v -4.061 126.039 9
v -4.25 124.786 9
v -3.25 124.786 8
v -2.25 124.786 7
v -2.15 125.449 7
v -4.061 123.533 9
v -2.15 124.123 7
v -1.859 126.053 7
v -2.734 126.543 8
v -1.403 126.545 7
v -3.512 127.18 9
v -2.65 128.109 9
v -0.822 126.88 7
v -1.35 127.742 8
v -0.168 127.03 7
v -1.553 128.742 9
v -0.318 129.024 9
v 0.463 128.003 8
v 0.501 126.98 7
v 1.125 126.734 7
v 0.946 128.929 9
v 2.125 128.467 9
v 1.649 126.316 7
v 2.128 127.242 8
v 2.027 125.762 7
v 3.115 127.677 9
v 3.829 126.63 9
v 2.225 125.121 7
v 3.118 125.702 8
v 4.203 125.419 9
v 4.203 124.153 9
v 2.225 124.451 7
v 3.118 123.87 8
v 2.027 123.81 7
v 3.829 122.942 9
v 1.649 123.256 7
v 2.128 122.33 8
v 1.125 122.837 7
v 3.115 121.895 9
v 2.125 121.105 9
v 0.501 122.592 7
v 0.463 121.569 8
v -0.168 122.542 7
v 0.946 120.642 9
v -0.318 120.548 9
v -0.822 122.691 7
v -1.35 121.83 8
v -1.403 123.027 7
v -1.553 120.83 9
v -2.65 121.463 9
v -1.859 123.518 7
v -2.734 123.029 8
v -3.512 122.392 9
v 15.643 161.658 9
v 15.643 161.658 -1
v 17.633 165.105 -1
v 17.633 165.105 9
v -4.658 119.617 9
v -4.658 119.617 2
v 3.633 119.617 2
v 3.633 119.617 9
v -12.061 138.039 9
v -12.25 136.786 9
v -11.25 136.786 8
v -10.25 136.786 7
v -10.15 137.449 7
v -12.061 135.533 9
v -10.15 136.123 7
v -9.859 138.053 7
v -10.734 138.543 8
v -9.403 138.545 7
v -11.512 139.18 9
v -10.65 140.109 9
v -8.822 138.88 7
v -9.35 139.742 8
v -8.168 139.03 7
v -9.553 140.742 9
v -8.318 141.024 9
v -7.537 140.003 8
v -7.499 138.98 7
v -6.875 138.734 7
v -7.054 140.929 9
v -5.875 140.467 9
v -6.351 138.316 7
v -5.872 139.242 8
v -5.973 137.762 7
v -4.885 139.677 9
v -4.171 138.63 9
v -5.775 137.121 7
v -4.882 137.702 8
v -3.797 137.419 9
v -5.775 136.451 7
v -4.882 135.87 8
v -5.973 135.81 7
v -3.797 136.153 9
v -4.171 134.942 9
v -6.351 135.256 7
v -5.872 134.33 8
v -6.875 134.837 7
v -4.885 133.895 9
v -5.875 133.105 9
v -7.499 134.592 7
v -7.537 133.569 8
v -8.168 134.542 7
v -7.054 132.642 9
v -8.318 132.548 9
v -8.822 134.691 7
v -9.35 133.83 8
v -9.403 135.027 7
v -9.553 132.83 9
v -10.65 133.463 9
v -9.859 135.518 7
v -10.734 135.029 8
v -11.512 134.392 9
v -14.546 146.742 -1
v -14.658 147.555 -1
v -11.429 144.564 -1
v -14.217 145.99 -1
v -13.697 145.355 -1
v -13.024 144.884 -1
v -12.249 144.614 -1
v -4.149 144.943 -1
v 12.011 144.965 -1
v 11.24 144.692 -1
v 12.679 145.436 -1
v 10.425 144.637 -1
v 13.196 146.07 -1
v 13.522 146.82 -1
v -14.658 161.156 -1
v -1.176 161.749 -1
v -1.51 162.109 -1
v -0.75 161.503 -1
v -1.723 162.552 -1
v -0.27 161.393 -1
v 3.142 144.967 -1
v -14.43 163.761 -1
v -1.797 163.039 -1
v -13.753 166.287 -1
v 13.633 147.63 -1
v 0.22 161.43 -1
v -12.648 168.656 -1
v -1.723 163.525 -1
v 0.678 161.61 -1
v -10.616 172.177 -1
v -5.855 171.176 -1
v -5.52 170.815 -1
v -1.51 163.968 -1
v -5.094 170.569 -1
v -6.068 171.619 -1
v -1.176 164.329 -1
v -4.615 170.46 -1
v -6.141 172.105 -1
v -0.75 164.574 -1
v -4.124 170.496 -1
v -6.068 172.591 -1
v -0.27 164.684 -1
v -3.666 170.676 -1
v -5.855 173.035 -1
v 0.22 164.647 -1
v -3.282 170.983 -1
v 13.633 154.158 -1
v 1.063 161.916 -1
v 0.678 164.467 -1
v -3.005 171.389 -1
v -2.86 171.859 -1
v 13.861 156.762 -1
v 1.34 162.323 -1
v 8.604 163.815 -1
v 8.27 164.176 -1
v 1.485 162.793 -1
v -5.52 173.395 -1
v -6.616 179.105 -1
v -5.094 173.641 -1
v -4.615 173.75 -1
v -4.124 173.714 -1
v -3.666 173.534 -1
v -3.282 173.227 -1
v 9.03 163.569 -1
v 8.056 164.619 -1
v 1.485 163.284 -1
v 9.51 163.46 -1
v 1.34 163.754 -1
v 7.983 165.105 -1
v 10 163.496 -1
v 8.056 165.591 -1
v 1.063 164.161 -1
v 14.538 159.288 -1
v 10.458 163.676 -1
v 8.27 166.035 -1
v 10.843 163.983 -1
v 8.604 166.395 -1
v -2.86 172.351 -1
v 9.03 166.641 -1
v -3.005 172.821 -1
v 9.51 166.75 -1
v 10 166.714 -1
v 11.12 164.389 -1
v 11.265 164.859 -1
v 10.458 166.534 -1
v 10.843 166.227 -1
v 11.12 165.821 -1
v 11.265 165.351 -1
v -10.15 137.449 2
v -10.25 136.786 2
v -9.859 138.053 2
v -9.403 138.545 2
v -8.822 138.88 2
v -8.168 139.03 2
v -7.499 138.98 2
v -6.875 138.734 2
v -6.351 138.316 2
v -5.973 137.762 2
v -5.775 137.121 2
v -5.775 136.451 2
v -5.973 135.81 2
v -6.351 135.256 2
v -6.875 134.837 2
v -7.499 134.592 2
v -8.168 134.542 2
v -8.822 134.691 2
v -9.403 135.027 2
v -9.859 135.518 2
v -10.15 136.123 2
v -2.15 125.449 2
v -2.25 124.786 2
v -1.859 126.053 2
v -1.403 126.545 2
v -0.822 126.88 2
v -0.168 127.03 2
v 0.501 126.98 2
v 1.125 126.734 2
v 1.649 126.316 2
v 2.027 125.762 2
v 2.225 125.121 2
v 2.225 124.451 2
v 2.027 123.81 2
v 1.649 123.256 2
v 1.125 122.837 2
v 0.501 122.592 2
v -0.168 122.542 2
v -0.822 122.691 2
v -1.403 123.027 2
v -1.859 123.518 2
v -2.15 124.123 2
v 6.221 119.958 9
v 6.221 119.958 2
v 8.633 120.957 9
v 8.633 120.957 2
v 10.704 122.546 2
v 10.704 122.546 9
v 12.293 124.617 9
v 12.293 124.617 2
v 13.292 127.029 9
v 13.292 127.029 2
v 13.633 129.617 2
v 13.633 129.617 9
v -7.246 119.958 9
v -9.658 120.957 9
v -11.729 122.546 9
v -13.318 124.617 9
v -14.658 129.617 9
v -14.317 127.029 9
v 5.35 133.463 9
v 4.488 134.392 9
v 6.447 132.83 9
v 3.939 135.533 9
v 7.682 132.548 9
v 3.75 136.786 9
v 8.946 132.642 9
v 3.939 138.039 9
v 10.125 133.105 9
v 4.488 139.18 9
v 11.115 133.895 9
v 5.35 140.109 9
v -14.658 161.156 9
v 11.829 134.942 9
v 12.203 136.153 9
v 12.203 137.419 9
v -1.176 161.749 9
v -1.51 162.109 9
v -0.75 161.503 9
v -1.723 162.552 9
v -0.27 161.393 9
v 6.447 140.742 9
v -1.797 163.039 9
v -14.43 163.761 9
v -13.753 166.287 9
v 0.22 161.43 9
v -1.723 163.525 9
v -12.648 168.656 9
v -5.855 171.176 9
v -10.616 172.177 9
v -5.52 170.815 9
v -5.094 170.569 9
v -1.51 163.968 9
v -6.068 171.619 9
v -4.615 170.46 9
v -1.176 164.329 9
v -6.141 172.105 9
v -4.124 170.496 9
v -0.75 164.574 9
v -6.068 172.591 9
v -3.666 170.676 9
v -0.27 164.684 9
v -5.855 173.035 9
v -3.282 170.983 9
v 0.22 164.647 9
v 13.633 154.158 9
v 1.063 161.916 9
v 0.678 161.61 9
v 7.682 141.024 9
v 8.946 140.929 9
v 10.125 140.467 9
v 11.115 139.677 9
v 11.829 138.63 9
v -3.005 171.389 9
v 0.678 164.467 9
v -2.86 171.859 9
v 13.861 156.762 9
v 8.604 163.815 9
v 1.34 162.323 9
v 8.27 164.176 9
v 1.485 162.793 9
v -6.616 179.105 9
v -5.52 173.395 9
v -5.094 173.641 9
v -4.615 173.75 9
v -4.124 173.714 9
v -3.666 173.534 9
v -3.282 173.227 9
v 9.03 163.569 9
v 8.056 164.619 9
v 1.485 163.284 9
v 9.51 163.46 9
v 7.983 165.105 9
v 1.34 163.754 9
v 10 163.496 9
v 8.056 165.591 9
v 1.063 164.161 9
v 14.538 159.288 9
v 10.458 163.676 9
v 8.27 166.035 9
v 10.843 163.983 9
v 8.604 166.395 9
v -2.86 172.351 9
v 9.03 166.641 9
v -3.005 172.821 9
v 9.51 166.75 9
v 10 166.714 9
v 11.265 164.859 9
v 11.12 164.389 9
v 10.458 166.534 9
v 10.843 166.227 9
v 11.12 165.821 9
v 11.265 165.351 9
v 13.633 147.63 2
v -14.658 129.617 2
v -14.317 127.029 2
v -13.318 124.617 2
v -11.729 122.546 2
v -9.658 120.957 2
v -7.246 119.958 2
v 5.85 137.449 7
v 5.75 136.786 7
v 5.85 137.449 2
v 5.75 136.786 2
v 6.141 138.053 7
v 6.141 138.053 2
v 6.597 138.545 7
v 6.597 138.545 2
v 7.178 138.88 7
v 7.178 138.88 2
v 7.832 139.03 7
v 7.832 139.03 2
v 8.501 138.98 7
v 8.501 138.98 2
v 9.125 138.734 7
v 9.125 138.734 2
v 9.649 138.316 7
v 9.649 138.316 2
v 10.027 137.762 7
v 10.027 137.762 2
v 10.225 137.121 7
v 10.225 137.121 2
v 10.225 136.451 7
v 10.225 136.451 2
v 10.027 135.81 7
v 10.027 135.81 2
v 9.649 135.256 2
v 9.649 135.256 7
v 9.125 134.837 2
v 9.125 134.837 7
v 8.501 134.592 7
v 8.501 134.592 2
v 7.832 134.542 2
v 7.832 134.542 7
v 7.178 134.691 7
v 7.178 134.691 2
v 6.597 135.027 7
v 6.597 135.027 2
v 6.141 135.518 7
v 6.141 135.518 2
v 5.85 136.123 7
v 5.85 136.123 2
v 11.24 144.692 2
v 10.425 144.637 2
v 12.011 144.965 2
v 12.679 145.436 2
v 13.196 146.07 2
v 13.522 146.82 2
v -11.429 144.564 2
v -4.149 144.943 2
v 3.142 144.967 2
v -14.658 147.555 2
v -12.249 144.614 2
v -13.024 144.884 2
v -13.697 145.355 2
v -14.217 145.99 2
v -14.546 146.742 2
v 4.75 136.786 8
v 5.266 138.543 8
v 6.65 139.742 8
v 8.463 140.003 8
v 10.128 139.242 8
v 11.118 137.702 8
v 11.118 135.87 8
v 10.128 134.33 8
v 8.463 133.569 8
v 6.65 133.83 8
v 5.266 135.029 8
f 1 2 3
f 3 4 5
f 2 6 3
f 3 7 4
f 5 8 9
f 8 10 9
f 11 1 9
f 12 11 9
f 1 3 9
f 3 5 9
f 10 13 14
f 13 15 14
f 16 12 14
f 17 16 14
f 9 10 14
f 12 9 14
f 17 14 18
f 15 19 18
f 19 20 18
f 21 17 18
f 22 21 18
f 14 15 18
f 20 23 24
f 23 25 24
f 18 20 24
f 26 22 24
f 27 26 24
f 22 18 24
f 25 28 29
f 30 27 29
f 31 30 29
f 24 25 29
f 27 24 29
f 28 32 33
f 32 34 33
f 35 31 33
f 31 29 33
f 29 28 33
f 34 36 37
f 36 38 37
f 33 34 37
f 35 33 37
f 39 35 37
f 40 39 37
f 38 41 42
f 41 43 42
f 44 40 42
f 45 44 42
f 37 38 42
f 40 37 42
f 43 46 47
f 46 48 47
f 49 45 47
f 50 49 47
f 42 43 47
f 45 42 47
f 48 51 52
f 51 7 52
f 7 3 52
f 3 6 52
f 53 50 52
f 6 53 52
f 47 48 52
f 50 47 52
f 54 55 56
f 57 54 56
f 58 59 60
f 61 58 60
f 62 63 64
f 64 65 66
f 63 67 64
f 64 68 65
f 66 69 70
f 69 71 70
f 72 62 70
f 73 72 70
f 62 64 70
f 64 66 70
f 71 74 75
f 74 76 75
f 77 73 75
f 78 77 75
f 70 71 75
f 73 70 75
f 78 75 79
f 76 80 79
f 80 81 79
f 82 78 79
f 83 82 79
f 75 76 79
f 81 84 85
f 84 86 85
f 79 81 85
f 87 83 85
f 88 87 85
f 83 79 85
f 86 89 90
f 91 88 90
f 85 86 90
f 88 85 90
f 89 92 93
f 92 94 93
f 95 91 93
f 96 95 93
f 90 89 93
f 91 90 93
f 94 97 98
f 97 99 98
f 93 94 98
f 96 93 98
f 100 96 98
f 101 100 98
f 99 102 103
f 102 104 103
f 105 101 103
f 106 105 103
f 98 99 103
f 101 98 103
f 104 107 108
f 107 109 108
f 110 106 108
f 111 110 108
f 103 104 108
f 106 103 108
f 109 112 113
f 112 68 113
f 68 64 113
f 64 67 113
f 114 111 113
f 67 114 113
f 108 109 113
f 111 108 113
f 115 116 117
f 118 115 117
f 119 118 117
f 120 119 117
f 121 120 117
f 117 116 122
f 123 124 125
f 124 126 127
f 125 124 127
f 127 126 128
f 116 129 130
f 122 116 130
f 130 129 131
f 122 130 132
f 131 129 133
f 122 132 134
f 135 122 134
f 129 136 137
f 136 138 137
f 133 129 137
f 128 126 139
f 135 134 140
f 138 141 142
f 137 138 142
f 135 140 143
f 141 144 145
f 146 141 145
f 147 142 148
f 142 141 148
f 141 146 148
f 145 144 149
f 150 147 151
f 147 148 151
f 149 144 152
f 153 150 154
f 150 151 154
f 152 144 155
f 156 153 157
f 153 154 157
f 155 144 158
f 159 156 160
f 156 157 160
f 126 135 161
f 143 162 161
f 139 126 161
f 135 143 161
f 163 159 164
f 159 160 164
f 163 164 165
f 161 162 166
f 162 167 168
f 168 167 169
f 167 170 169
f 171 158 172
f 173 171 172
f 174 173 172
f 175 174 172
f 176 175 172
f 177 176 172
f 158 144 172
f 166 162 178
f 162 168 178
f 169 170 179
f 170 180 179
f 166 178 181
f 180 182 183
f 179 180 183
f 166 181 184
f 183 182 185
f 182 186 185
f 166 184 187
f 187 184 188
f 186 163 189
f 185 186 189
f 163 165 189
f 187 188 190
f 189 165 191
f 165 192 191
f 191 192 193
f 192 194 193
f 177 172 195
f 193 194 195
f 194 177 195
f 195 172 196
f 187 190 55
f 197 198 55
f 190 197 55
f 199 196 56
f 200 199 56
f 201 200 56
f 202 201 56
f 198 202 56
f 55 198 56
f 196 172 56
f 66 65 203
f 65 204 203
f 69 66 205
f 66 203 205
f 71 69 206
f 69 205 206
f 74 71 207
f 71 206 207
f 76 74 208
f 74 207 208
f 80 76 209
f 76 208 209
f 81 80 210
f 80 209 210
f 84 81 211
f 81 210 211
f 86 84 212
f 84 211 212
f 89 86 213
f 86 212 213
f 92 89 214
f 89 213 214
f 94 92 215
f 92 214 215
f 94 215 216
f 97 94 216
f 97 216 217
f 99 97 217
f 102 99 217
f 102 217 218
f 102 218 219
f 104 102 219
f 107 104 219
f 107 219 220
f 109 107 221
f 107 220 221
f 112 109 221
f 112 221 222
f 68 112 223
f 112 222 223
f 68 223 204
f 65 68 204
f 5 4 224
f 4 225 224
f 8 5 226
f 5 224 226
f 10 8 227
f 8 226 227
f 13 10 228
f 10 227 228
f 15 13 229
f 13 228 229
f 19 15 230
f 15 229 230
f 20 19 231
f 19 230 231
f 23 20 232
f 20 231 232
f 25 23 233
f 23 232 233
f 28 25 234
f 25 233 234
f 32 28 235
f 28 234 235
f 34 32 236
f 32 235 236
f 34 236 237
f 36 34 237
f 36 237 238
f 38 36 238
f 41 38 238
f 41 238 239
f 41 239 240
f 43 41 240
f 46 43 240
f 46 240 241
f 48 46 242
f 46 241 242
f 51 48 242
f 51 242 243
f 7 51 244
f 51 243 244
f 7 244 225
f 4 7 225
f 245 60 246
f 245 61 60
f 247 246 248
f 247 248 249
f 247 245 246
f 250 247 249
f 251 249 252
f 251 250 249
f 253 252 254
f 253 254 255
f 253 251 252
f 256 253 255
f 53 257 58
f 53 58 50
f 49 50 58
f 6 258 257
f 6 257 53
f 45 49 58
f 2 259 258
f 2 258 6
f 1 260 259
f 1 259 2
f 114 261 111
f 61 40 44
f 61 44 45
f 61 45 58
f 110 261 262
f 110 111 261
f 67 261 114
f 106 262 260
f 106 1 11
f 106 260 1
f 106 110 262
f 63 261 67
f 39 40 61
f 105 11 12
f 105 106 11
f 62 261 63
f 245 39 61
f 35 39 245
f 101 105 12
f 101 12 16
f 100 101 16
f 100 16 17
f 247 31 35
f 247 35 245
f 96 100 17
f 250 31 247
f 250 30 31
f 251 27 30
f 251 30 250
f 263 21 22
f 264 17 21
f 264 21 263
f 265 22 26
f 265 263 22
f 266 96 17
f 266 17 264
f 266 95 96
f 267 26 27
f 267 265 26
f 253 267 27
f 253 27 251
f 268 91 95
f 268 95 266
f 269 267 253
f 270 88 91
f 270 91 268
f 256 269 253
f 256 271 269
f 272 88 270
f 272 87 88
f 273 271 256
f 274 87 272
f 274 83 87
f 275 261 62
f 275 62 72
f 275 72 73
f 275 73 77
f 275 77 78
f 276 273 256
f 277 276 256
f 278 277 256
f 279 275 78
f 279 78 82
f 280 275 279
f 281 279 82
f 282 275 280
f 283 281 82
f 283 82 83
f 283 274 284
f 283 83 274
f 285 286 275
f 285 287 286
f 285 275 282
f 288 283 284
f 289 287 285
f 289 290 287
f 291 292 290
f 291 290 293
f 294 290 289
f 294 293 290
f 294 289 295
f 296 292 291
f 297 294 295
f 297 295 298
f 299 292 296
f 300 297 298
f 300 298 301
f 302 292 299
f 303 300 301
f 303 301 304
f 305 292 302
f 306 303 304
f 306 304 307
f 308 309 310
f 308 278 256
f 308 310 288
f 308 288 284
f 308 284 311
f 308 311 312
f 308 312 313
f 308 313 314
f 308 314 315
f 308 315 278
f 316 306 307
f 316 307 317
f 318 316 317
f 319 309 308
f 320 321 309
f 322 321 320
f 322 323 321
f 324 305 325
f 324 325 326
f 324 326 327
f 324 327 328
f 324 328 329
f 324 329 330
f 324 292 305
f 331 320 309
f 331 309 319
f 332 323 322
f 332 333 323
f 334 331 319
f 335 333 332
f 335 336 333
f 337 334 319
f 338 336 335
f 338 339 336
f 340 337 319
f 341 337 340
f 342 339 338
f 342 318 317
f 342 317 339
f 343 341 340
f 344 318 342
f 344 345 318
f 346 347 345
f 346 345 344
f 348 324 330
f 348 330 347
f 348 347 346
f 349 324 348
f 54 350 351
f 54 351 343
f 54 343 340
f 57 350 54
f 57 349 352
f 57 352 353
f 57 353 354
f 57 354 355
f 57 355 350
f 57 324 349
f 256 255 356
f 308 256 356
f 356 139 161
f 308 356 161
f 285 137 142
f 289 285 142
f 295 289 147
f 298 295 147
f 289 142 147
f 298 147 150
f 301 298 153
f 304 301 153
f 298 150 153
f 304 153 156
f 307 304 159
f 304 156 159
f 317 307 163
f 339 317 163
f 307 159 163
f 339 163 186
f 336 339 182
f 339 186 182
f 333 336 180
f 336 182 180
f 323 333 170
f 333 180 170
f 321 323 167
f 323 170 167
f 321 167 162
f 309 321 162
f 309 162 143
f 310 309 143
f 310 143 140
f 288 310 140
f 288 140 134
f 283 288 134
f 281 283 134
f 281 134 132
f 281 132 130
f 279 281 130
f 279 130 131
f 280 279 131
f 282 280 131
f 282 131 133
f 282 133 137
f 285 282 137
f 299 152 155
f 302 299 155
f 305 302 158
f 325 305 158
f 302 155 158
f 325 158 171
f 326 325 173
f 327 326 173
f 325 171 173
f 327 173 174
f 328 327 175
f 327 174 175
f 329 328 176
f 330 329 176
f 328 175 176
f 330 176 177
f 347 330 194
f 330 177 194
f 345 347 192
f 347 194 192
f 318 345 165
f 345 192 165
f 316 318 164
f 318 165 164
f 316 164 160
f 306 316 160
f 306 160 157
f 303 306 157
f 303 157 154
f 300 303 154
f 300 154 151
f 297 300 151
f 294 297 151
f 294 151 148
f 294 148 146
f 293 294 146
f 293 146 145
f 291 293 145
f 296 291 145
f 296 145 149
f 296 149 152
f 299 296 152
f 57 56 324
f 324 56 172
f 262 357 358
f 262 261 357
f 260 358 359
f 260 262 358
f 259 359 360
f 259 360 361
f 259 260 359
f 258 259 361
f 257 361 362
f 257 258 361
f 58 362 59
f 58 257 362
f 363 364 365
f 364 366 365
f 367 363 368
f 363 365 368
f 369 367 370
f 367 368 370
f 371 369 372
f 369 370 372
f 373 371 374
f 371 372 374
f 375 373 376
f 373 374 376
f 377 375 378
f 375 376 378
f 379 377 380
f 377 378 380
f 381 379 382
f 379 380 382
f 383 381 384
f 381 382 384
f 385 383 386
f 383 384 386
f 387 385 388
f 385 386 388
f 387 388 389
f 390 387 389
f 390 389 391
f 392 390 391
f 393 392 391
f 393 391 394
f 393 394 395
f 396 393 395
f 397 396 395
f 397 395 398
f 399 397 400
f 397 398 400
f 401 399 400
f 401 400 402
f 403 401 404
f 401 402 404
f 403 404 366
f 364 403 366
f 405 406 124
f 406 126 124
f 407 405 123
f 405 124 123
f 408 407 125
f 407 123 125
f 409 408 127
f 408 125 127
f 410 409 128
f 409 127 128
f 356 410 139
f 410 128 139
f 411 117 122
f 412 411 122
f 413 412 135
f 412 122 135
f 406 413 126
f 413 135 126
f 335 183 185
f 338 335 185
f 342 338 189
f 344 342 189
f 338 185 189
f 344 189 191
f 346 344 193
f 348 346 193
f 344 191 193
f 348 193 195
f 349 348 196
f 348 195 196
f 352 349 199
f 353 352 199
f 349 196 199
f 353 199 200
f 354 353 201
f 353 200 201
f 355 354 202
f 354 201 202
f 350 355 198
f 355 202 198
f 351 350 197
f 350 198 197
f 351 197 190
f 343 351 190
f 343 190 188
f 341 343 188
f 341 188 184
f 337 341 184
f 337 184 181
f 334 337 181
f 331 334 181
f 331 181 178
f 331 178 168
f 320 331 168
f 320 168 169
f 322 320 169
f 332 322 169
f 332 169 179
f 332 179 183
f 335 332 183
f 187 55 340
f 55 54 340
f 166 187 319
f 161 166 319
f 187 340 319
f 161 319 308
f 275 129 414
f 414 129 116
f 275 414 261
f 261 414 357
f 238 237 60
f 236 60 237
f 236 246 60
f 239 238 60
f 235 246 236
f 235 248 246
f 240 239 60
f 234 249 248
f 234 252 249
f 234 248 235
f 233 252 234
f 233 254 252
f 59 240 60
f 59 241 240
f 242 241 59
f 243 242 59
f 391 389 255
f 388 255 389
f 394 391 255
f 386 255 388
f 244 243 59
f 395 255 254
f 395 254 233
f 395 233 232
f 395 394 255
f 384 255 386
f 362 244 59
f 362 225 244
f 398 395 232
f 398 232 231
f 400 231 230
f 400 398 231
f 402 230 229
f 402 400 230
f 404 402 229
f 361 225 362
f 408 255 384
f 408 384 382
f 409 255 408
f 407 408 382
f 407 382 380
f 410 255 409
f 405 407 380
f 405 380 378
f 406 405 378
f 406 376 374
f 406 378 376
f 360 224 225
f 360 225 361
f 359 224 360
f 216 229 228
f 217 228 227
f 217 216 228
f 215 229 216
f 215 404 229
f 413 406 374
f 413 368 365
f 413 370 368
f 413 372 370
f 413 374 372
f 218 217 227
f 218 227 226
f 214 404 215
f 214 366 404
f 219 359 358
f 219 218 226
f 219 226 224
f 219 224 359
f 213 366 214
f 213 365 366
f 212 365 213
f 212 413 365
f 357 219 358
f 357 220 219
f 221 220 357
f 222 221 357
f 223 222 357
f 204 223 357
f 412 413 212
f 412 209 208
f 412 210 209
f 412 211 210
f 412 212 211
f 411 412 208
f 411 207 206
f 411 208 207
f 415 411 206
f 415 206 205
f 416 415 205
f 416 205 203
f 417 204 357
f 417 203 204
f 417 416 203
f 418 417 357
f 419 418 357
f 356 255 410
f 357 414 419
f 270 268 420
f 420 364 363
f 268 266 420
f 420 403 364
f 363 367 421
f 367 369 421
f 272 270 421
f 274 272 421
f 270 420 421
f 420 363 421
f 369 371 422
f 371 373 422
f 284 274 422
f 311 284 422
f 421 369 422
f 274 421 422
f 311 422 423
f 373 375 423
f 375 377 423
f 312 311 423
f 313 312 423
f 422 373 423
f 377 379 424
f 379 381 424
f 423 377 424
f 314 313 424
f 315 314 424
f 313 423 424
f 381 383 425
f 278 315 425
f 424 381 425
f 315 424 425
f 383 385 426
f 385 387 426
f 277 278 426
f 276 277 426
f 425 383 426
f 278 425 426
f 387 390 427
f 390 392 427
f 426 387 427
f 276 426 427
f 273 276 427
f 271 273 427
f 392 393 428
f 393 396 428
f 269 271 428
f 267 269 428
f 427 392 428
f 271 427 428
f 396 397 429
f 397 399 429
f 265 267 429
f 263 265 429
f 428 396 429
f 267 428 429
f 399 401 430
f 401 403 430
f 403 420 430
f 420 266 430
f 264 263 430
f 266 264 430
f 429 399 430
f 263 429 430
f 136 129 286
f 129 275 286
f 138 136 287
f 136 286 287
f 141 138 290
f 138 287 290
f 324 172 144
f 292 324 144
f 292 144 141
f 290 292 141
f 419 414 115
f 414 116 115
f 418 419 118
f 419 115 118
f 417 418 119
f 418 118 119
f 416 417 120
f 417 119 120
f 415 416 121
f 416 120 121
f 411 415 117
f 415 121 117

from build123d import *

# Parameters (mm, degrees)
BOSS_EXTRUDE1_DEPTH                                 = 9
BOSS_EXTRUDE1_DEPTH_BACK                            = 1
CUT_EXTRUDE1_DEPTH                                  = 3
CSK_FOR_M4_COUNTERSUNK_FLAT_HEAD_SCREW2_D           = 4.5
CSK_FOR_M4_COUNTERSUNK_FLAT_HEAD_SCREW2_CSINK_D     = 8.5
CSK_FOR_M4_COUNTERSUNK_FLAT_HEAD_SCREW2_CSINK_ANGLE = 90
FILLET1_R                                           = 15
FILLET2_R                                           = 10
FILLET3_R                                           = 3
SKETCH12_R                                          = 1.65
CUT_EXTRUDE2_DEPTH                                  = 181.248579312


with BuildPart() as part:
    # Sketch1 → Boss-Extrude1 (new, two sides: drawn at the far end of the back side and taken through both)
    with BuildSketch(Plane.XY.offset(-BOSS_EXTRUDE1_DEPTH_BACK)):
        Polygon((-14.65789802, 119.616999761), (13.633055873, 119.616999761), (13.633055873, 139.616999761), (13.633055873, 158.176865611), (17.633055873, 165.105068841), (-6.615655433, 179.105068841), (-10.615655433, 172.176865611), (-14.65789802, 165.175496074), (-14.65789802, 158.176865611), (-14.65789802, 139.616999761), align=None)
    extrude(amount=BOSS_EXTRUDE1_DEPTH + BOSS_EXTRUDE1_DEPTH_BACK)

    # Sketch3 → Cut-Extrude1 (cut)
    with BuildSketch(Plane(origin=(0, 0, -1), x_dir=(-1, 0, 0), z_dir=(0, 0, -1))):
        with BuildLine():
            Line((-15, 144.248115566), (-15, 114.785930714))
            Line((-15, 114.785930714), (15, 114.785930714))
            Line((15, 114.785930714), (15, 144.248115566))
            ThreePointArc((15, 144.248115566), (0, 145), (-15, 144.248115566))
        make_face()
    extrude(amount=-CUT_EXTRUDE1_DEPTH, mode=Mode.SUBTRACT)

    # CSK for M4 Countersunk Flat Head Screw2 (through all)
    with Locations(Plane.XY.offset(9)):
        with Locations((0, 0), (8, 136.785930714), (-8, 136.785930714), (0, 124.785930714)):
            CounterSinkHole(CSK_FOR_M4_COUNTERSUNK_FLAT_HEAD_SCREW2_D / 2, CSK_FOR_M4_COUNTERSUNK_FLAT_HEAD_SCREW2_CSINK_D / 2, counter_sink_angle=CSK_FOR_M4_COUNTERSUNK_FLAT_HEAD_SCREW2_CSINK_ANGLE)

    # Fillet1
    fillet1_edges = [part.edges().sort_by_distance(p)[0] for p in [
        (-14.65789802, 165.175496074, 4),
        (13.633055873, 158.176865611, 4),
    ]]
    fillet(fillet1_edges, radius=FILLET1_R)

    # Fillet2
    fillet2_edges = [part.edges().sort_by_distance(p)[0] for p in [
        (13.633055873, 119.616999761, 5.5),
        (-14.65789802, 119.616999761, 5.5),
    ]]
    fillet(fillet2_edges, radius=FILLET2_R)

    # Fillet3
    fillet3_edges = [part.edges().sort_by_distance(p)[0] for p in [
        (-14.65789802, 144.282102161, 0.5),
        (13.633055873, 144.379181239, 0.5),
    ]]
    fillet(fillet3_edges, radius=FILLET3_R)

    # Sketch12 → Cut-Extrude2 (cut, through all)
    with BuildSketch(Plane(origin=(0, 0, -1), x_dir=(-1, 0, 0), z_dir=(0, 0, -1))):
        with Locations((4.49129978, 172.105068841)):
            Circle(SKETCH12_R)
        with Locations((-9.633055873, 165.105068841)):
            Circle(SKETCH12_R)
        with Locations((0.146785414, 163.038543864)):
            Circle(SKETCH12_R)
    extrude(amount=-CUT_EXTRUDE2_DEPTH, mode=Mode.SUBTRACT)


solid = part.part
